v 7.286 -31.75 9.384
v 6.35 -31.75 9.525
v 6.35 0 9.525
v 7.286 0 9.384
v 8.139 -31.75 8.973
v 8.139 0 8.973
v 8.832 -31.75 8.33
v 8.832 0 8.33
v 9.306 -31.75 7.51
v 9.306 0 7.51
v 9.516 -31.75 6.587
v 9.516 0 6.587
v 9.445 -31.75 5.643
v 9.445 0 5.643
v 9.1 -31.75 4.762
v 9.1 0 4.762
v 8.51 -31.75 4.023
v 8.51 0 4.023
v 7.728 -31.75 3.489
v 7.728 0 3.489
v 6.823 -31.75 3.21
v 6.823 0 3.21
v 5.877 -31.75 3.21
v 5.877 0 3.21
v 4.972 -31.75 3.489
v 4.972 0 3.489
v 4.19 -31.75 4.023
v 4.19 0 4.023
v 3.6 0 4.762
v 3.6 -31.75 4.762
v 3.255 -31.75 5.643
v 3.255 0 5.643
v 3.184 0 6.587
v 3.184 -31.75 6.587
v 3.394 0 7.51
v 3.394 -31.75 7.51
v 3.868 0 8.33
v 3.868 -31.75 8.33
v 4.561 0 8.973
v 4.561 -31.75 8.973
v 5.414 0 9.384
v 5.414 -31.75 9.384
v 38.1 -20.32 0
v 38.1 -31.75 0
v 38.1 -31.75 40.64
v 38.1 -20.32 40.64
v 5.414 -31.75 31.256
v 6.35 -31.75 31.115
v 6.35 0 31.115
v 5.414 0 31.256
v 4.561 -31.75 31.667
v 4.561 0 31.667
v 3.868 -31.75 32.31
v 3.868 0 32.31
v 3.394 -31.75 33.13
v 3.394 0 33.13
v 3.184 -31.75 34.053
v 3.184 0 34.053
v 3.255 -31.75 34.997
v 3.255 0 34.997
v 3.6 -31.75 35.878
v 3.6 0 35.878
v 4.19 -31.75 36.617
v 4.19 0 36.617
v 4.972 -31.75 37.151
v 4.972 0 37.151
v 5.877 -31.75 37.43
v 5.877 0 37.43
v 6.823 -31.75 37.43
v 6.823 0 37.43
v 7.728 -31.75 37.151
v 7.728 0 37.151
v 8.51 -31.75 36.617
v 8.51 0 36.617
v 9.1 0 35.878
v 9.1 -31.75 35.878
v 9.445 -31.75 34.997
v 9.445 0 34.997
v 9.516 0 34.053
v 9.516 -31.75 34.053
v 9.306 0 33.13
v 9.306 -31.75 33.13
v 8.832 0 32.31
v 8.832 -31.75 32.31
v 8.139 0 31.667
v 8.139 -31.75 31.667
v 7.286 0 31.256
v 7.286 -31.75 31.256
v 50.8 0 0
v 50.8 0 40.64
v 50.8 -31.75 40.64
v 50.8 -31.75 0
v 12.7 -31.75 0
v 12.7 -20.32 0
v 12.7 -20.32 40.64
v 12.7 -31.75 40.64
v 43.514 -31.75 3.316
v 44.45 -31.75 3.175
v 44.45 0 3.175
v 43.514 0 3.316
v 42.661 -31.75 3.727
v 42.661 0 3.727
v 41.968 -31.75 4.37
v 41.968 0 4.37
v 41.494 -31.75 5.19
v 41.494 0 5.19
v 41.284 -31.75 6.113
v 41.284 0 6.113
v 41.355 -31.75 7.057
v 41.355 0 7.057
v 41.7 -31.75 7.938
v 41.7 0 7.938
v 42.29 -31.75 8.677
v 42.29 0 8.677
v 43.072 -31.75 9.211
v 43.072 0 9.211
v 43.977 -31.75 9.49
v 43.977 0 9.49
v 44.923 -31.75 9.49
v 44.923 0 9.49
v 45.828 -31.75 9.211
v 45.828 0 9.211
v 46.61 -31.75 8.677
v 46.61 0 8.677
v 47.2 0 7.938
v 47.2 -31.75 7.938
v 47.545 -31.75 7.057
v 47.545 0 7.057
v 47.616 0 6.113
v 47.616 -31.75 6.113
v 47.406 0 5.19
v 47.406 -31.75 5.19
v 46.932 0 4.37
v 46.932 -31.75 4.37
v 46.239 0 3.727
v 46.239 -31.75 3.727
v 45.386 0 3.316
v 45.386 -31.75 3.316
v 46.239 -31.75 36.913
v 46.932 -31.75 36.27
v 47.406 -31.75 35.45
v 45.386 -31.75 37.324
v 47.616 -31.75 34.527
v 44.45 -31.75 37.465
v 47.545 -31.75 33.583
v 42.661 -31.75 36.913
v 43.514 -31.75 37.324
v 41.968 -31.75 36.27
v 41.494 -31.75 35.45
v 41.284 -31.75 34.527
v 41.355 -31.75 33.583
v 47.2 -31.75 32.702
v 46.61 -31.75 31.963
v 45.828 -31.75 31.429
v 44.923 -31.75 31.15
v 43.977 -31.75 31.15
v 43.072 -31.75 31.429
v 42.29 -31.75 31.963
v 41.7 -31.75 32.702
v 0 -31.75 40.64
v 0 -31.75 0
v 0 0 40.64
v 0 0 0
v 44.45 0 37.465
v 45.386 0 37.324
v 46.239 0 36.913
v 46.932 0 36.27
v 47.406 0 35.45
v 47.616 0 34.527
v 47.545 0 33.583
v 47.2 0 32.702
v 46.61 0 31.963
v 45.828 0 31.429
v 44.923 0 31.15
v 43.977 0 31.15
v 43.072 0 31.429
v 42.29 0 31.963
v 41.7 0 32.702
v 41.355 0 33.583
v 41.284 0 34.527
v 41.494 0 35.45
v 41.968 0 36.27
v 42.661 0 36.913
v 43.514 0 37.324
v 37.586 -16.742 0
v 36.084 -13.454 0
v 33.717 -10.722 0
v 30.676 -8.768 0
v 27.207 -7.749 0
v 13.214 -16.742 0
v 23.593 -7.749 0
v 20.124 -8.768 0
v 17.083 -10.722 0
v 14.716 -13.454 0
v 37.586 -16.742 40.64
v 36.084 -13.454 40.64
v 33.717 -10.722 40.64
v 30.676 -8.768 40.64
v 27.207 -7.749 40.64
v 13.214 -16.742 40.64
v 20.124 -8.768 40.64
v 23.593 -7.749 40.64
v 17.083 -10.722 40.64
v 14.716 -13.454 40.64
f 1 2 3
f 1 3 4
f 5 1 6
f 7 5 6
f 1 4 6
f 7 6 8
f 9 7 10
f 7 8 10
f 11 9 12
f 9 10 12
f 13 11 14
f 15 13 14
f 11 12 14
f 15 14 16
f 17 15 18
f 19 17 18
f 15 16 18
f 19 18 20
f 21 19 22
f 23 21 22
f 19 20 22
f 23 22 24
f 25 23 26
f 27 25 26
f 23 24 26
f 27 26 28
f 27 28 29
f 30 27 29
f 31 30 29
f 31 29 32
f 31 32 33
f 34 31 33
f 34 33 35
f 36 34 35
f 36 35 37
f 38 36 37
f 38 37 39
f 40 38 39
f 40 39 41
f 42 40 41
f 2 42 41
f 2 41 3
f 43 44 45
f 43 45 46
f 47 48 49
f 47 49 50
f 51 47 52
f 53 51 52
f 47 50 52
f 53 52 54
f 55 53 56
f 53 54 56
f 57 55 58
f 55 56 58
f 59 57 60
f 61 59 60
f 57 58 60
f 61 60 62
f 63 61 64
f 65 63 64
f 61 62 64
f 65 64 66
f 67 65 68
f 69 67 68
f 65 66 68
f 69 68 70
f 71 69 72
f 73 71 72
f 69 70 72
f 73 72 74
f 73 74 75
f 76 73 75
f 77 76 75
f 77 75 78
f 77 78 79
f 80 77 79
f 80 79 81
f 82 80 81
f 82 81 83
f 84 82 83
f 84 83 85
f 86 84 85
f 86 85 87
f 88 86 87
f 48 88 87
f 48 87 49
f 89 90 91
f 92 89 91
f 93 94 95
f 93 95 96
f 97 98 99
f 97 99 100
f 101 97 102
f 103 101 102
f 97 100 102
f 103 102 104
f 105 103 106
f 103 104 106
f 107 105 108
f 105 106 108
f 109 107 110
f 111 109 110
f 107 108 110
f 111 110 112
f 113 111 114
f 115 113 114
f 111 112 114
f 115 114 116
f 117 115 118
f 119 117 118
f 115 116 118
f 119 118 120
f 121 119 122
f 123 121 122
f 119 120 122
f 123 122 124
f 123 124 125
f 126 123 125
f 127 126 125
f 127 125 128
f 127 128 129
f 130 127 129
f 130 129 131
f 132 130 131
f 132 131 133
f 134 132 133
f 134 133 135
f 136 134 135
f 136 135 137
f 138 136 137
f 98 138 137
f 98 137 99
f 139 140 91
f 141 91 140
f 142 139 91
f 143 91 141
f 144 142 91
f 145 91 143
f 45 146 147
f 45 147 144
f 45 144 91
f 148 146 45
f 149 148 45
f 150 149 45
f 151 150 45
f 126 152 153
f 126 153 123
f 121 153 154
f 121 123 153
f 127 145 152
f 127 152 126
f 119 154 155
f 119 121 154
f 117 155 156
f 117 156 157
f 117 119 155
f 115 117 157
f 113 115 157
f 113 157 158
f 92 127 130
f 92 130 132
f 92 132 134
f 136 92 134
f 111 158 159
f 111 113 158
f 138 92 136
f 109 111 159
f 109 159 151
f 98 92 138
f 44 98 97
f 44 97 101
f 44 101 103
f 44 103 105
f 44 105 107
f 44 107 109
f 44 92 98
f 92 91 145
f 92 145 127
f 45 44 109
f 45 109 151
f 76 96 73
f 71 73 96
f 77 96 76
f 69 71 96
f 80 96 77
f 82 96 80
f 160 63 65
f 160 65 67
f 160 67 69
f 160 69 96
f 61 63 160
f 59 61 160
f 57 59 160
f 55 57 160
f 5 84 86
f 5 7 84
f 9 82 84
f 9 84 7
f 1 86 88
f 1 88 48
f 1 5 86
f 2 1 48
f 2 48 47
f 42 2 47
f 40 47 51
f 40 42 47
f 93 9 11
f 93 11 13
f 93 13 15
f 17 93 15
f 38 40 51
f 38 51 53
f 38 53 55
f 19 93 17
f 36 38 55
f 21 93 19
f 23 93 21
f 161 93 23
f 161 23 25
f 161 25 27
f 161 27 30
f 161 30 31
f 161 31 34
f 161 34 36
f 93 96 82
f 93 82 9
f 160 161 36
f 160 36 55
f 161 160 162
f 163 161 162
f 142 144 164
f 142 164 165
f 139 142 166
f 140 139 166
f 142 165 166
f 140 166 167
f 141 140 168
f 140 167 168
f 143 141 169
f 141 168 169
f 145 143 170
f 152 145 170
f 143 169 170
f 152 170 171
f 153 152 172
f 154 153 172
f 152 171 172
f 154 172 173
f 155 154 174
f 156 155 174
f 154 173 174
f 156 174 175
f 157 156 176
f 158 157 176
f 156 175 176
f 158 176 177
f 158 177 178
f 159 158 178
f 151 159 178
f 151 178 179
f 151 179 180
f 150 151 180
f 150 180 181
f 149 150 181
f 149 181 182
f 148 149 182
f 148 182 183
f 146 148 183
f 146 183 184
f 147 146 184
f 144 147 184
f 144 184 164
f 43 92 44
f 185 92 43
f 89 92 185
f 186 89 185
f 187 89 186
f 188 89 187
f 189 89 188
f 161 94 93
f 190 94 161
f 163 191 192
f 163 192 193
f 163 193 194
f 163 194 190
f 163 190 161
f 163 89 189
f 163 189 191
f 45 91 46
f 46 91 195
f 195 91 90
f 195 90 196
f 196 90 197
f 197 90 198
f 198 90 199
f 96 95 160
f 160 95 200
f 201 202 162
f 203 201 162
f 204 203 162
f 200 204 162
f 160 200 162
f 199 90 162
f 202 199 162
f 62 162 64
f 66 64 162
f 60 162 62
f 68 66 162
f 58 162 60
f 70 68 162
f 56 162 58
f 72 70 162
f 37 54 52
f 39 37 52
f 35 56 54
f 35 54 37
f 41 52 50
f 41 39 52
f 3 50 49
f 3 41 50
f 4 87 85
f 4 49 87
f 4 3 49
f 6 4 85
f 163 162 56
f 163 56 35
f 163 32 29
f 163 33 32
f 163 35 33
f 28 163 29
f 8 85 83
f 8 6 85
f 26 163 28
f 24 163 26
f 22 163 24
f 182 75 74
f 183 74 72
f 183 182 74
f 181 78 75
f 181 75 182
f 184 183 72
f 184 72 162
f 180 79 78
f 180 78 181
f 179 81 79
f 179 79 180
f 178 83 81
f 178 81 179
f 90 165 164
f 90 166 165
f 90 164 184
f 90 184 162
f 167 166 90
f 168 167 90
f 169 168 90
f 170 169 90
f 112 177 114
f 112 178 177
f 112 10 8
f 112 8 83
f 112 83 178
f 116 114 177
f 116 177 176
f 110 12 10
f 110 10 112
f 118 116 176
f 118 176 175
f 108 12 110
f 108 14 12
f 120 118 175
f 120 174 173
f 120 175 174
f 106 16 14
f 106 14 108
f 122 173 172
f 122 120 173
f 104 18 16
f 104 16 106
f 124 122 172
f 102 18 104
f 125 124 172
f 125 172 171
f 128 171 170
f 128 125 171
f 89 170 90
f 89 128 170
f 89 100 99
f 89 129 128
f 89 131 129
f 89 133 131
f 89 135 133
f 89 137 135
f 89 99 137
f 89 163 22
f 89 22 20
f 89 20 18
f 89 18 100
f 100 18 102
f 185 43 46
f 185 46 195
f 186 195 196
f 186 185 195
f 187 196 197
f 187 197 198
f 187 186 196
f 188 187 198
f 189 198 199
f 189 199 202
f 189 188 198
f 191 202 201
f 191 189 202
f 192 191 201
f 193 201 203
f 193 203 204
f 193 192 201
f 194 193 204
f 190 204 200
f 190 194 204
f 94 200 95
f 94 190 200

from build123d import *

# Parameters (mm, degrees)
BOSS_EXTRUDE1_DEPTH = 40.64
SKETCH2_R           = 3.175
CUT_EXTRUDE1_DEPTH  = 73.39


with BuildPart() as part:
    # Sketch1 → Boss-Extrude1 (new body)
    with BuildSketch(Plane.XY):
        with BuildLine():
            Line((0, 0), (50.8, 0))
            Line((50.8, 0), (50.8, -31.75))
            Line((50.8, -31.75), (38.1, -31.75))
            Line((38.1, -31.75), (38.1, -20.32))
            ThreePointArc((38.1, -20.32), (25.4, -7.62), (12.7, -20.32))
            Line((12.7, -20.32), (12.7, -31.75))
            Line((12.7, -31.75), (0, -31.75))
            Line((0, -31.75), (0, 0))
        make_face()
    extrude(amount=BOSS_EXTRUDE1_DEPTH)

    # Sketch2 → Cut-Extrude1 (cut, through all)
    with BuildSketch(Plane(origin=(0, 0, 0), x_dir=(1, 0, 0), z_dir=(0, 1, 0))):
        with Locations(Location((6.35, -6.35, 0), (0, 0, 270))):
            Circle(SKETCH2_R)
        with Locations(Location((44.45, -6.35, 0), (0, 0, 90))):
            Circle(SKETCH2_R)
        with Locations(Location((6.35, -34.29, 0), (0, 0, 90))):
            Circle(SKETCH2_R)
        with Locations(Location((44.45, -34.29, 0), (0, 0, 270))):
            Circle(SKETCH2_R)
    extrude(amount=-CUT_EXTRUDE1_DEPTH, mode=Mode.SUBTRACT)


solid = part.part
